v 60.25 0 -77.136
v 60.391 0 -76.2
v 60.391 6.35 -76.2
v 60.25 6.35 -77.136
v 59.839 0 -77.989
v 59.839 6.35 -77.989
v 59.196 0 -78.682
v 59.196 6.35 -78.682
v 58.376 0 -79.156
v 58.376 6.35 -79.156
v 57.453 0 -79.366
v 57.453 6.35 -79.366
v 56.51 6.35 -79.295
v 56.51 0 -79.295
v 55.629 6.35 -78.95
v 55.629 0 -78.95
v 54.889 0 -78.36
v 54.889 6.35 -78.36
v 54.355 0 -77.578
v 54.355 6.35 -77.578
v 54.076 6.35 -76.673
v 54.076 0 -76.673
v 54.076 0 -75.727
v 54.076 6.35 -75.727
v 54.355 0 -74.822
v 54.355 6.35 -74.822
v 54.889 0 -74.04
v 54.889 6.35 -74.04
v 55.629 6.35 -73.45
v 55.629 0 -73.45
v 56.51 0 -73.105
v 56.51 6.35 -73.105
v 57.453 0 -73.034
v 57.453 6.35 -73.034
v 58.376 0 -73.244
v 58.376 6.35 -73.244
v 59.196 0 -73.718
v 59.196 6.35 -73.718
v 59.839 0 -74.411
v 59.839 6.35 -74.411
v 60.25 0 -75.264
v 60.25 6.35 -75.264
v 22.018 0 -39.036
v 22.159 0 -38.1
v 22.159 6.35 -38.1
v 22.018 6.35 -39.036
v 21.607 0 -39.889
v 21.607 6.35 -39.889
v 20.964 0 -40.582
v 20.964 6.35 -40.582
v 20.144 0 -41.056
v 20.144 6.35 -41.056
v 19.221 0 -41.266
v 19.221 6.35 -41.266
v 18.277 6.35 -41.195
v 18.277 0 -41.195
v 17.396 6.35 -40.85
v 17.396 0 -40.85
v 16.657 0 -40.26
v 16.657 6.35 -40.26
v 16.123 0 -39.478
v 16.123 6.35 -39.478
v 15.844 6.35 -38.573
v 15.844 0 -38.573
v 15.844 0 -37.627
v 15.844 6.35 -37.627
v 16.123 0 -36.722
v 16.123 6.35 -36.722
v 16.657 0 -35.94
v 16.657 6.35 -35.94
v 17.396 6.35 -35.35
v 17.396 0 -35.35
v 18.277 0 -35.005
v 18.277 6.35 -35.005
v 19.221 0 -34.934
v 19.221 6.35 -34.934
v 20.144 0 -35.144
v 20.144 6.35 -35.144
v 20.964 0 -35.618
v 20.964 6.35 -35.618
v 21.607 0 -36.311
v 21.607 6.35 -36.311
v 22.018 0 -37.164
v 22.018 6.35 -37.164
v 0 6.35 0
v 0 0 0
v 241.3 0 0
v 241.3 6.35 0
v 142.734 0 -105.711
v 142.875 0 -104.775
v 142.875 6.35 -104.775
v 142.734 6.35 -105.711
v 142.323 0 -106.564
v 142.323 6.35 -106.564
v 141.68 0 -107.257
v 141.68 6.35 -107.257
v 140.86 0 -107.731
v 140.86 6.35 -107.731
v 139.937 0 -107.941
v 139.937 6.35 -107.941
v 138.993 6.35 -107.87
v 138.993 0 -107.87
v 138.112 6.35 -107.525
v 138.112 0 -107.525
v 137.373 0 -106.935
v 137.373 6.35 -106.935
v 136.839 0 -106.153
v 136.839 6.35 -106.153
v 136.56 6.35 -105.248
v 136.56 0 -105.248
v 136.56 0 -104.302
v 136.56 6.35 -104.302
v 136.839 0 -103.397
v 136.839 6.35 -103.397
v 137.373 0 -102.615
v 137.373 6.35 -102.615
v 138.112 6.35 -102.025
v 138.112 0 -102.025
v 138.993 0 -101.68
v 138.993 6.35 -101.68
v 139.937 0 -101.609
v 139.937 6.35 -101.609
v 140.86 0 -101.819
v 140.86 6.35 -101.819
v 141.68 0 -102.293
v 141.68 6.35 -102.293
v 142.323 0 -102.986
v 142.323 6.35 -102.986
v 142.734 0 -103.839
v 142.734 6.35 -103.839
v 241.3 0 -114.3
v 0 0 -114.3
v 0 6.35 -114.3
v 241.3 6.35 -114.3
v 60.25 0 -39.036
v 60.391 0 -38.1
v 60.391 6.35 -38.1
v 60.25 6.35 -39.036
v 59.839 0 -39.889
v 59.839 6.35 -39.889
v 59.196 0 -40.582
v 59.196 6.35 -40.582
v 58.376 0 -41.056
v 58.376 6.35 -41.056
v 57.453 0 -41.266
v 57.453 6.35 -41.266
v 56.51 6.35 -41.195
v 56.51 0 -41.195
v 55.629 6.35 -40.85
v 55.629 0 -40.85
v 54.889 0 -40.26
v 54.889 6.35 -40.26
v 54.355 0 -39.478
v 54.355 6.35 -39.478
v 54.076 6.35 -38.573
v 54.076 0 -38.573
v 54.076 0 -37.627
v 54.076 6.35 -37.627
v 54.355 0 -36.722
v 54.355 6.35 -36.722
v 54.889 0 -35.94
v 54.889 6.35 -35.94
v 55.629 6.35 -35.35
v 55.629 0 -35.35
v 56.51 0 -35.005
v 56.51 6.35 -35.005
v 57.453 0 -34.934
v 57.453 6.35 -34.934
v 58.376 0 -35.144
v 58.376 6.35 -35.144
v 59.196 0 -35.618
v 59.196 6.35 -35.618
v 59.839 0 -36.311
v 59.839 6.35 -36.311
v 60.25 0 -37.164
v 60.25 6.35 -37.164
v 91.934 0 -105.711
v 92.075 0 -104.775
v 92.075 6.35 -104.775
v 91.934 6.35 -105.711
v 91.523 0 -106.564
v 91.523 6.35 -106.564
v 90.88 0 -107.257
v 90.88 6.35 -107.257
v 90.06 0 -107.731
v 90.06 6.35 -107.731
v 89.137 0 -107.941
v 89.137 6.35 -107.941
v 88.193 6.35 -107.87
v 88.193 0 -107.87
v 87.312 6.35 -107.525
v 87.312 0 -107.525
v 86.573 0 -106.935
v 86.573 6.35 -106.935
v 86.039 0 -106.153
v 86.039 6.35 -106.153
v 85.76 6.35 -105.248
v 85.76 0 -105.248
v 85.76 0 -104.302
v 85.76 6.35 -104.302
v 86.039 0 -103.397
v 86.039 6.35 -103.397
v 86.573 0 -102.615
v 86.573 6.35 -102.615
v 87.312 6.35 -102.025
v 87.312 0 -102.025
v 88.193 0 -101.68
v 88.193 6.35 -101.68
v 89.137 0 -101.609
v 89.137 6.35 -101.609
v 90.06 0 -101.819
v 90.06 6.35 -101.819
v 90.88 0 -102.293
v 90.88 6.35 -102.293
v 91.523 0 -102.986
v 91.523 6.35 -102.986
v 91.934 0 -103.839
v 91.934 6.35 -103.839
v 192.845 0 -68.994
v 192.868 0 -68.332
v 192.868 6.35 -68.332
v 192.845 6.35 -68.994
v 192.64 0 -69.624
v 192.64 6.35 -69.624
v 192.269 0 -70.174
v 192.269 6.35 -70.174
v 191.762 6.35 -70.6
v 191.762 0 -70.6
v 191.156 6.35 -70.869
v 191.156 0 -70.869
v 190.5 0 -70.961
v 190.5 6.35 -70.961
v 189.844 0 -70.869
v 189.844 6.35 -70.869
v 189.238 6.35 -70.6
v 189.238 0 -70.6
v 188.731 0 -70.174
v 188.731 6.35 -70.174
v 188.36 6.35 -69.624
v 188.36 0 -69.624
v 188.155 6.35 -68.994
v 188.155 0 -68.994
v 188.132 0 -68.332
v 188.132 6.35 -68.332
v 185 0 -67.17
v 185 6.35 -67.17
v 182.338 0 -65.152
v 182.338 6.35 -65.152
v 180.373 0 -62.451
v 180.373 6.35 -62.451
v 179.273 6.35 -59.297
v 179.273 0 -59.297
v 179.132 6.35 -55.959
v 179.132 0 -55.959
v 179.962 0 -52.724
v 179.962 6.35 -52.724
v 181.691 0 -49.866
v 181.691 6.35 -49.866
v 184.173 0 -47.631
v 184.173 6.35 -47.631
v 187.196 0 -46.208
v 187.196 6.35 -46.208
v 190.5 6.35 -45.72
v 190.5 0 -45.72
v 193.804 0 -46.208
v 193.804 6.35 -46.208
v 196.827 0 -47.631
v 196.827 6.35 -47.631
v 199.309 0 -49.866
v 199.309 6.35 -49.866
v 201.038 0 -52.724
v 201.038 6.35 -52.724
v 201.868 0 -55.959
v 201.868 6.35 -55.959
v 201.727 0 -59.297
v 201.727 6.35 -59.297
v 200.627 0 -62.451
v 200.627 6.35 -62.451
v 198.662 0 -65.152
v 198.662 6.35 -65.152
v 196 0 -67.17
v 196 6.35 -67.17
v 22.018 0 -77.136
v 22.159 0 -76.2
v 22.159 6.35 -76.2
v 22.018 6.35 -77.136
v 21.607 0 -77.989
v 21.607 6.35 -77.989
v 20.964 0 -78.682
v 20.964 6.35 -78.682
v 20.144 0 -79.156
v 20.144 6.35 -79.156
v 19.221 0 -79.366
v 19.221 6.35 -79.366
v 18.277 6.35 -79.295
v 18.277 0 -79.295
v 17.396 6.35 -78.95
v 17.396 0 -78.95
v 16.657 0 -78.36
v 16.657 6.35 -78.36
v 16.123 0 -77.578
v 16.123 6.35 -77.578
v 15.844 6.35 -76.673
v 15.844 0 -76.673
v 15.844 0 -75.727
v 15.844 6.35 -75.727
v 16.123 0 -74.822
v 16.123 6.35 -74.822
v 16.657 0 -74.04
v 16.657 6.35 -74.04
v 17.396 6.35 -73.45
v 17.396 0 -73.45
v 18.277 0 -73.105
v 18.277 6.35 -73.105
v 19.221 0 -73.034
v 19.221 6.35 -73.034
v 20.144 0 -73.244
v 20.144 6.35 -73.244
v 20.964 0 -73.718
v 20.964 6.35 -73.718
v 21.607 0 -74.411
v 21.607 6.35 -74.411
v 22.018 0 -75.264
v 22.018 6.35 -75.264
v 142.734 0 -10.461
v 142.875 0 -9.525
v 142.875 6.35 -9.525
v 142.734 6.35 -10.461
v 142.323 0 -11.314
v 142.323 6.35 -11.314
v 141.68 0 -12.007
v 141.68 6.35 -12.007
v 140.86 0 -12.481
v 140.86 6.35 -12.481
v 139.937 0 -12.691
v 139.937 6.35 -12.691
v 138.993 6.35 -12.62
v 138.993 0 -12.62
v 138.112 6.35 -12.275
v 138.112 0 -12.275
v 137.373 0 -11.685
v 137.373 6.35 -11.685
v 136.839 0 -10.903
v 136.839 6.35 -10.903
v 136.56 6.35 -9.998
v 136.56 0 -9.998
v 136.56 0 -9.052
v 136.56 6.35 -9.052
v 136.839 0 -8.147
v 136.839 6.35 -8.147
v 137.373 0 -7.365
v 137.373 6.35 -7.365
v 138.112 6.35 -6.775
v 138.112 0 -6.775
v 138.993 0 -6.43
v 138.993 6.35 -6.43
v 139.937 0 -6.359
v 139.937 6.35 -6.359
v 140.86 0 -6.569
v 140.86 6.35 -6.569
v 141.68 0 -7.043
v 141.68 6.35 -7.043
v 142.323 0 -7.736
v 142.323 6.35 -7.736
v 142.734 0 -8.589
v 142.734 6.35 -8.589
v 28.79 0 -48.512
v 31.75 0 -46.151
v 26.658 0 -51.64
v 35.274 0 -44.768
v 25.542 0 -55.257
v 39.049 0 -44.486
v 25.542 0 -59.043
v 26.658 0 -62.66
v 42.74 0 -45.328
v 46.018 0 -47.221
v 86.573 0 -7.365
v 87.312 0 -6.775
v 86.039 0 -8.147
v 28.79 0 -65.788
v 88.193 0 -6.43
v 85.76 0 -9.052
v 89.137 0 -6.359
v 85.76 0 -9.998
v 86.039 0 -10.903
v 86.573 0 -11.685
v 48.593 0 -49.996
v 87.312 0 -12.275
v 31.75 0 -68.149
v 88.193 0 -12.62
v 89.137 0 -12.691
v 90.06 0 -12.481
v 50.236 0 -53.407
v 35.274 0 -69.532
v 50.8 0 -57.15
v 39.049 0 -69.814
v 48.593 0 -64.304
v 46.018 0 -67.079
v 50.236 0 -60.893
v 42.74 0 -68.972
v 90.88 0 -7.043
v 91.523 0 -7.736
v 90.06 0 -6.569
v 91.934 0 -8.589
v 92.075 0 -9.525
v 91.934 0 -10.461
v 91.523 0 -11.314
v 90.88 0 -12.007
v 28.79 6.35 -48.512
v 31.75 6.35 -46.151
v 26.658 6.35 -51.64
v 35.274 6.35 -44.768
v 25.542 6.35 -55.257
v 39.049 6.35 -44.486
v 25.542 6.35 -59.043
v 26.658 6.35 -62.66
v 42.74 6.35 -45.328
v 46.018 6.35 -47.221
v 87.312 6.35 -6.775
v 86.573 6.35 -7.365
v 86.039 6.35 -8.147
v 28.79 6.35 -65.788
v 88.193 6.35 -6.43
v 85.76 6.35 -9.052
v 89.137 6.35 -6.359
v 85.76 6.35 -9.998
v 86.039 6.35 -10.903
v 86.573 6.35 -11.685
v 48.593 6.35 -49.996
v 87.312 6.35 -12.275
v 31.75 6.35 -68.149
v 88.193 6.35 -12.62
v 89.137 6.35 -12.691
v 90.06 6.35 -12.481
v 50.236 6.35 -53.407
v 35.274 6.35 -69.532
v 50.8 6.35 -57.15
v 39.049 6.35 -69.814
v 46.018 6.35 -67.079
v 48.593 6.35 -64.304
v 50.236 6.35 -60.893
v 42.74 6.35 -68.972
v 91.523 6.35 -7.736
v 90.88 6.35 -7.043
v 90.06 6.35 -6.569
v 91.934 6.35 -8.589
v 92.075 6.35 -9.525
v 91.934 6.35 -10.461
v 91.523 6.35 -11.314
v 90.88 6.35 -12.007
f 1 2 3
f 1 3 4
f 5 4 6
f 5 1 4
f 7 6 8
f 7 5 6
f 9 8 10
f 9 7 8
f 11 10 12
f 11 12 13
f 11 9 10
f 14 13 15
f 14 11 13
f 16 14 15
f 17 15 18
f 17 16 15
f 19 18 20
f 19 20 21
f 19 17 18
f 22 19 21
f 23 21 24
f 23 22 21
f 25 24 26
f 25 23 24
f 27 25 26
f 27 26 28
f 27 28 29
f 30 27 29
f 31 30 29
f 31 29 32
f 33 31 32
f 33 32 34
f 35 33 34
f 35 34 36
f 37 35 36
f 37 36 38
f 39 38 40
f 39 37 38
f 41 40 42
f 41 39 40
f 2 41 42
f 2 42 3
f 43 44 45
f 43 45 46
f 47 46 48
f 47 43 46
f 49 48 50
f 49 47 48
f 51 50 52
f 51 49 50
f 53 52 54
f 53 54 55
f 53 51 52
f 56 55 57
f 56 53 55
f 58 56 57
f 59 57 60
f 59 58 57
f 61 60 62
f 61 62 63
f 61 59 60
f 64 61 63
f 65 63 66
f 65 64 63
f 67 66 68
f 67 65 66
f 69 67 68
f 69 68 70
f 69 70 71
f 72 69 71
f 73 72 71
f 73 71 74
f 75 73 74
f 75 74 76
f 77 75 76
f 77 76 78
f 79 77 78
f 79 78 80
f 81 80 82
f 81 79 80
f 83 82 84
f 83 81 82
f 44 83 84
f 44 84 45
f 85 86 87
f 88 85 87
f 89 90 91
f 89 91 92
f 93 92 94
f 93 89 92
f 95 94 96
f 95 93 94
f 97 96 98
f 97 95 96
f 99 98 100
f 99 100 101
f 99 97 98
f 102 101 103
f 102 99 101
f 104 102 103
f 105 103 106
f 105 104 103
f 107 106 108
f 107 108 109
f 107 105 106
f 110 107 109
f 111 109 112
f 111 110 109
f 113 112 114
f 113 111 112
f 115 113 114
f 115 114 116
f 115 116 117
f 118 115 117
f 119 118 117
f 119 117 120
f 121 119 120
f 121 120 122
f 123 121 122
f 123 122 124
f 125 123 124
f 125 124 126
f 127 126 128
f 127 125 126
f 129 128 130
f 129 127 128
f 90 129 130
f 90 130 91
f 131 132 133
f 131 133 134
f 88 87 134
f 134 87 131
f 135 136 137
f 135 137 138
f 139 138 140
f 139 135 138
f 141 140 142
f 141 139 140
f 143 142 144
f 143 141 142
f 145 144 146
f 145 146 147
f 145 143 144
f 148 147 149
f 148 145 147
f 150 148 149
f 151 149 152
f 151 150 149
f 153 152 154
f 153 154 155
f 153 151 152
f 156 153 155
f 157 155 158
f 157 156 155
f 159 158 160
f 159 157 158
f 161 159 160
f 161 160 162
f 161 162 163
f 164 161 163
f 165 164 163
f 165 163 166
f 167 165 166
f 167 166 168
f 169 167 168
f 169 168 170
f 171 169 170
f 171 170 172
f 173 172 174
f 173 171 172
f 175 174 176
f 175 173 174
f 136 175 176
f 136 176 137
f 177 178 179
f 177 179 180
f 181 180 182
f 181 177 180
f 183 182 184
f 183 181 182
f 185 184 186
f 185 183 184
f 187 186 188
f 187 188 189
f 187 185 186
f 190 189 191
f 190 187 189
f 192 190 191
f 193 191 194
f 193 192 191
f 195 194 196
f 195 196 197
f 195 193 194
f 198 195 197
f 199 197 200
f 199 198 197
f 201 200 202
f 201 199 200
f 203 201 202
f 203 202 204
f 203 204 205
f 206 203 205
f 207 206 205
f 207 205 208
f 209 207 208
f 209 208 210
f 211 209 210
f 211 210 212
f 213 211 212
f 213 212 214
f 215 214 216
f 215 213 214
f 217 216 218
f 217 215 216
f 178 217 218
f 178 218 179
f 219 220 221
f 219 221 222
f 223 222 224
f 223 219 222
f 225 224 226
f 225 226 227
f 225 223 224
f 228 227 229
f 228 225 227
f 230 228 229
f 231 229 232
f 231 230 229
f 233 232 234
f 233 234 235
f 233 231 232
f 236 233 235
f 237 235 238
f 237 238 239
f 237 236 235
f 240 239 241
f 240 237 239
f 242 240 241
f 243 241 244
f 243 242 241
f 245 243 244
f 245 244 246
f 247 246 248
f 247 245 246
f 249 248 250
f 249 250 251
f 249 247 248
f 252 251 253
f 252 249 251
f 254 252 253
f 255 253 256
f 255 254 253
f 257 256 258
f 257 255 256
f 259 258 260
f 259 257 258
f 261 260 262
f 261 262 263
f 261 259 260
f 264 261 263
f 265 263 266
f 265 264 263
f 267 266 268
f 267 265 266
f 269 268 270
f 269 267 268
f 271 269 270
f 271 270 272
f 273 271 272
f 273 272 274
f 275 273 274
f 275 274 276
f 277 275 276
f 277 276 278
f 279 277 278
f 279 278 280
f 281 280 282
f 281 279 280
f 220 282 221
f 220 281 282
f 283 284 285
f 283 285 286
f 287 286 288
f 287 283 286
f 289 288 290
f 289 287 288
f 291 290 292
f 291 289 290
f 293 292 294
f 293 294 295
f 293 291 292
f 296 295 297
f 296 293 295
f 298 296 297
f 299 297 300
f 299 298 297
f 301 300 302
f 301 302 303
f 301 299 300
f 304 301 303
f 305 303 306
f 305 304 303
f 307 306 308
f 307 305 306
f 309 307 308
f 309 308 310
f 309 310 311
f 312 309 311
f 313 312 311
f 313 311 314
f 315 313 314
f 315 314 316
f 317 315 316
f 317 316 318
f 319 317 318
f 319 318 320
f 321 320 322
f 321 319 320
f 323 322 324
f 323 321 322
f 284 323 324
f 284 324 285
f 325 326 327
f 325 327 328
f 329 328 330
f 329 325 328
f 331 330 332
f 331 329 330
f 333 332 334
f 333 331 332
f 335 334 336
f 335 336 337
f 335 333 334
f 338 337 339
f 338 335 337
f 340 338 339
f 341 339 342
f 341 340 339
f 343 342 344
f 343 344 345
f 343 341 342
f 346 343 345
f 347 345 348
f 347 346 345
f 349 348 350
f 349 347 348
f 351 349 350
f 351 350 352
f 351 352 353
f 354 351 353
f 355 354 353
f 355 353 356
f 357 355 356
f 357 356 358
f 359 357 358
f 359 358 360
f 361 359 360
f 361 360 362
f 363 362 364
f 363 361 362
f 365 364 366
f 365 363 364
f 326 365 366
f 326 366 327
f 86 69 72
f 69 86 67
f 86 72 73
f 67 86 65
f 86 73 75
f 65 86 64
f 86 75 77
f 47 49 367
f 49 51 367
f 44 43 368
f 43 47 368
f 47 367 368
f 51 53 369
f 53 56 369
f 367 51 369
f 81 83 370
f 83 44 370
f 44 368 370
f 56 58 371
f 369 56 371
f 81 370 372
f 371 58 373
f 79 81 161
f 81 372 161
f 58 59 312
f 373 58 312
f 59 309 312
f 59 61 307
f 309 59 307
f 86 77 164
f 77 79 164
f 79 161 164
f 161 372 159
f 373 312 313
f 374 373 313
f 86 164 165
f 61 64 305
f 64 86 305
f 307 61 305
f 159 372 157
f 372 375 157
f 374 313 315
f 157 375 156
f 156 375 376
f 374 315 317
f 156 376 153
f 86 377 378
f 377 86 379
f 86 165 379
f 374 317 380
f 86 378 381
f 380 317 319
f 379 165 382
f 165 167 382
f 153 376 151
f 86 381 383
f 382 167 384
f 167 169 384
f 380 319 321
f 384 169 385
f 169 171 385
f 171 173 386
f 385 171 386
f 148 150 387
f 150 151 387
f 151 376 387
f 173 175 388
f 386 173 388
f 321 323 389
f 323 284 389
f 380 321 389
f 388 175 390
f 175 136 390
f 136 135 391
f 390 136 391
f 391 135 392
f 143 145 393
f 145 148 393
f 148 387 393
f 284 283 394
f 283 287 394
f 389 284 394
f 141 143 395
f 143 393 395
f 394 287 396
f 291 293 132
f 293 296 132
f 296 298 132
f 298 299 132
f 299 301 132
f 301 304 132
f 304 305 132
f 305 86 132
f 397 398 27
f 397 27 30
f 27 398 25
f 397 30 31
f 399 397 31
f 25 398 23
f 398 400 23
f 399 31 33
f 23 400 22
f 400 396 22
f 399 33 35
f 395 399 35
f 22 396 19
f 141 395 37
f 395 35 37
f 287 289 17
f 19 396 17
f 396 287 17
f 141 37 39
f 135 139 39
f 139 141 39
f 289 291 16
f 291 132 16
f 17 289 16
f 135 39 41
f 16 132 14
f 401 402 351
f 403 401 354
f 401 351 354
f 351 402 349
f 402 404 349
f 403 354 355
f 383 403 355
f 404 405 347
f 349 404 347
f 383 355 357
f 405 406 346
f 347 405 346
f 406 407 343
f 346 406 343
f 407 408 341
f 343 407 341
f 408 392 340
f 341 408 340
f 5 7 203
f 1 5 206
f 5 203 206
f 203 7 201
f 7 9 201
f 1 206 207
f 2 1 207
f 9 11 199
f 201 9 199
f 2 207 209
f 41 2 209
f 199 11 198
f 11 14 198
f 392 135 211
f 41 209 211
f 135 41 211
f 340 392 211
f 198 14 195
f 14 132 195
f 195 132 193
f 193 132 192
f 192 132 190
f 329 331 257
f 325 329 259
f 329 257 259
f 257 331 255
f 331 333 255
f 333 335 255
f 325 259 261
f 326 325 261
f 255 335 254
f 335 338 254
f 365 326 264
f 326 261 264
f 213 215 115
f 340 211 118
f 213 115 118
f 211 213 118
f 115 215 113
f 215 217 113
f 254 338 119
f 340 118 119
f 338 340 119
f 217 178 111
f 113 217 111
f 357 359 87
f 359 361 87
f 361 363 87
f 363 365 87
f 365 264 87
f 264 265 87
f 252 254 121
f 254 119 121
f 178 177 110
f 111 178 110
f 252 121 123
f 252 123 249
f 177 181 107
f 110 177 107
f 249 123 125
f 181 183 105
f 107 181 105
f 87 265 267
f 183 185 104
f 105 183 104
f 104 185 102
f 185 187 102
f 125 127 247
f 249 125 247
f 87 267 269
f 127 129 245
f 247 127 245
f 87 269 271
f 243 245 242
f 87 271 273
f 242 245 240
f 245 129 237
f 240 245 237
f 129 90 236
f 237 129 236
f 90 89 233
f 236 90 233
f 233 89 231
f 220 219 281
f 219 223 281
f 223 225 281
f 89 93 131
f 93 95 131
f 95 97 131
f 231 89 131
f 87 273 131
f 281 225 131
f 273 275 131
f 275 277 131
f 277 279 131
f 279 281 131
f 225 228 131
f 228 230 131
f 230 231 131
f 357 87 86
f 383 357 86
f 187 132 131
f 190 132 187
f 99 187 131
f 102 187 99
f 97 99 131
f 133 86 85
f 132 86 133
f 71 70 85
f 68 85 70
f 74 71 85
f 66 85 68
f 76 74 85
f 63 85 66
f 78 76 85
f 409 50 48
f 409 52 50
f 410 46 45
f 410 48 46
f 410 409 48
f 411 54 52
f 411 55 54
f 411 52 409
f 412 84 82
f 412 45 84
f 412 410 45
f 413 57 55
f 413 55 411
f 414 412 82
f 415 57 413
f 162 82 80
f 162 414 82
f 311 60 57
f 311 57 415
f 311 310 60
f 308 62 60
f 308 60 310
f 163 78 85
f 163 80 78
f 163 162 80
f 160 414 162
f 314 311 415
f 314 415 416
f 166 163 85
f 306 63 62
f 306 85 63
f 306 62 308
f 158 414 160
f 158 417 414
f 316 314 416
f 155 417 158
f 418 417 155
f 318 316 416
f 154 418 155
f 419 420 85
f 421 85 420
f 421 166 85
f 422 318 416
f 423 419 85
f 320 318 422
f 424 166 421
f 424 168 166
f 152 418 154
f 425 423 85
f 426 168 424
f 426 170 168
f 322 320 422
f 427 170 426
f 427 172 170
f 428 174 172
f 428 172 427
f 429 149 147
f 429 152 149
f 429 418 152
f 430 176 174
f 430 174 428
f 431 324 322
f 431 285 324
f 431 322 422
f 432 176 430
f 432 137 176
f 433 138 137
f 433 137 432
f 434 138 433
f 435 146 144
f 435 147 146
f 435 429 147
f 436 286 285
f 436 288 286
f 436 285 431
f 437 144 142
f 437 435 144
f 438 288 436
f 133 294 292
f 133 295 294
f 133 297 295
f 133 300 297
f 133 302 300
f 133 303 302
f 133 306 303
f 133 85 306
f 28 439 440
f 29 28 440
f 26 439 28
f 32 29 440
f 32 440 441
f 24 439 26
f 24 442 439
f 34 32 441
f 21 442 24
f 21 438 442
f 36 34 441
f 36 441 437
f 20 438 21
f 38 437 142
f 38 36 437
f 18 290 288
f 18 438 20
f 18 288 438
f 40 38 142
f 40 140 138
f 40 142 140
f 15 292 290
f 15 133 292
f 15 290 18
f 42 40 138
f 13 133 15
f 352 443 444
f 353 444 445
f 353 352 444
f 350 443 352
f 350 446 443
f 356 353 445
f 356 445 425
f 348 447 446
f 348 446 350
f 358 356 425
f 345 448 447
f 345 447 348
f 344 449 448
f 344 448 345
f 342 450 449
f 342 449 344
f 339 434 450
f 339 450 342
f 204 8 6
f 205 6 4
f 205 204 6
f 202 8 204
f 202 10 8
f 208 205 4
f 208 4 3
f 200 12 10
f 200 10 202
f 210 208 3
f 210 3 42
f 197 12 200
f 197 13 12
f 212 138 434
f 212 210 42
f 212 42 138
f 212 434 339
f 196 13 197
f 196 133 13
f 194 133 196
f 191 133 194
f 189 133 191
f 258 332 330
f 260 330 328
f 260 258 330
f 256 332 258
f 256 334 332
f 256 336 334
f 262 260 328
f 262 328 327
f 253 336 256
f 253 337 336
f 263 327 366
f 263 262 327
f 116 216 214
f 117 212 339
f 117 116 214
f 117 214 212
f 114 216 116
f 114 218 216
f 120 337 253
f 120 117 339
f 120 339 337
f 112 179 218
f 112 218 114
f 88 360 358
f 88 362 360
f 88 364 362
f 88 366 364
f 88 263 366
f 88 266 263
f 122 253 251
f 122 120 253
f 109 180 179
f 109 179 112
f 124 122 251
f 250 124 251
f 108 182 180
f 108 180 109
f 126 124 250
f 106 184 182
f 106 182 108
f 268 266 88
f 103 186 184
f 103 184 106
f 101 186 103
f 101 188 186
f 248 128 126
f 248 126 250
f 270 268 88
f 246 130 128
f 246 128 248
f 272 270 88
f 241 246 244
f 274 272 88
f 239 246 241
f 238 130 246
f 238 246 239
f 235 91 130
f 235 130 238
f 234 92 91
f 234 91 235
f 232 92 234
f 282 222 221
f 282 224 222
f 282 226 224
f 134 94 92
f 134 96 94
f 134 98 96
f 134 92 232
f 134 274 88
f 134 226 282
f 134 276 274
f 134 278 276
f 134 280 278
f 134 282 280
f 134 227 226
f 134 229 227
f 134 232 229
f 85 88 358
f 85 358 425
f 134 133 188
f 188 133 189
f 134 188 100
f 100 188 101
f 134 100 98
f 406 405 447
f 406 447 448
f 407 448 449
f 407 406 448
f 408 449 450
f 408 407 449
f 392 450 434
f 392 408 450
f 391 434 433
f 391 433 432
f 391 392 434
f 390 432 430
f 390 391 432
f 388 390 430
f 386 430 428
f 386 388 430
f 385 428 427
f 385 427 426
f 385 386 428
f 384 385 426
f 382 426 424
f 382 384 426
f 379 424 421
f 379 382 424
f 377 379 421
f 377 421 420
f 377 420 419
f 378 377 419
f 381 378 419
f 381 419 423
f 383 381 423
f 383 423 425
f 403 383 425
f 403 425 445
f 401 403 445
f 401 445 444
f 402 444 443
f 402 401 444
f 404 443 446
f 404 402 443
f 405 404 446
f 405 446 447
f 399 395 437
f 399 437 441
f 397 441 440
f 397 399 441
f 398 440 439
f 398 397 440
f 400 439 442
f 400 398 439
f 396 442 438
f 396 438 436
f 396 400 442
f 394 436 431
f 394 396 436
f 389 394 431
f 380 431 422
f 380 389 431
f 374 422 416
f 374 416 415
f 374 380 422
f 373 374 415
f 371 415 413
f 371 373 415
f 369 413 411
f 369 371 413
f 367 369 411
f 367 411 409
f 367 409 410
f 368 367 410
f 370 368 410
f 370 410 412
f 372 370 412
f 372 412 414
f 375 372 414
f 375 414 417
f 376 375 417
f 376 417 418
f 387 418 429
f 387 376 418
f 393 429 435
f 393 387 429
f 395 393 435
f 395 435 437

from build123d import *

# Parameters (mm, degrees)
SKETCH1_W           = 241.3
SKETCH1_H           = 114.3
SKETCH1_R           = 12.7
SKETCH1_R_2         = 3.175
BOSS_EXTRUDE1_DEPTH = 6.35


with BuildPart() as part:
    # Sketch1 → Boss-Extrude1 (new body)
    with BuildSketch(Plane(origin=(0, 0, 0), x_dir=(1, 0, 0), z_dir=(0, 1, 0))):
        with Locations((120.65, 57.15)):
            Rectangle(SKETCH1_W, SKETCH1_H)
        with Locations((38.1, 57.15)):
            Circle(SKETCH1_R, mode=Mode.SUBTRACT)
        with Locations((88.9, 104.775)):
            Circle(SKETCH1_R_2, mode=Mode.SUBTRACT)
        with Locations((139.7, 104.775)):
            Circle(SKETCH1_R_2, mode=Mode.SUBTRACT)
        with Locations((139.7, 9.525)):
            Circle(SKETCH1_R_2, mode=Mode.SUBTRACT)
        with Locations((88.9, 9.525)):
            Circle(SKETCH1_R_2, mode=Mode.SUBTRACT)
        with Locations((18.983968606, 76.2)):
            Circle(SKETCH1_R_2, mode=Mode.SUBTRACT)
        with Locations((18.983968606, 38.1)):
            Circle(SKETCH1_R_2, mode=Mode.SUBTRACT)
        with Locations((57.216031394, 38.1)):
            Circle(SKETCH1_R_2, mode=Mode.SUBTRACT)
        with Locations((57.216031394, 76.2)):
            Circle(SKETCH1_R_2, mode=Mode.SUBTRACT)
        with BuildLine():
            ThreePointArc((188.131704345, 68.331953125), (190.5, 45.72), (192.868295655, 68.331953125))
            ThreePointArc((192.868295655, 68.331953125), (190.5, 70.96125), (188.131704345, 68.331953125))
        make_face(mode=Mode.SUBTRACT)
    extrude(amount=BOSS_EXTRUDE1_DEPTH)


solid = part.part
